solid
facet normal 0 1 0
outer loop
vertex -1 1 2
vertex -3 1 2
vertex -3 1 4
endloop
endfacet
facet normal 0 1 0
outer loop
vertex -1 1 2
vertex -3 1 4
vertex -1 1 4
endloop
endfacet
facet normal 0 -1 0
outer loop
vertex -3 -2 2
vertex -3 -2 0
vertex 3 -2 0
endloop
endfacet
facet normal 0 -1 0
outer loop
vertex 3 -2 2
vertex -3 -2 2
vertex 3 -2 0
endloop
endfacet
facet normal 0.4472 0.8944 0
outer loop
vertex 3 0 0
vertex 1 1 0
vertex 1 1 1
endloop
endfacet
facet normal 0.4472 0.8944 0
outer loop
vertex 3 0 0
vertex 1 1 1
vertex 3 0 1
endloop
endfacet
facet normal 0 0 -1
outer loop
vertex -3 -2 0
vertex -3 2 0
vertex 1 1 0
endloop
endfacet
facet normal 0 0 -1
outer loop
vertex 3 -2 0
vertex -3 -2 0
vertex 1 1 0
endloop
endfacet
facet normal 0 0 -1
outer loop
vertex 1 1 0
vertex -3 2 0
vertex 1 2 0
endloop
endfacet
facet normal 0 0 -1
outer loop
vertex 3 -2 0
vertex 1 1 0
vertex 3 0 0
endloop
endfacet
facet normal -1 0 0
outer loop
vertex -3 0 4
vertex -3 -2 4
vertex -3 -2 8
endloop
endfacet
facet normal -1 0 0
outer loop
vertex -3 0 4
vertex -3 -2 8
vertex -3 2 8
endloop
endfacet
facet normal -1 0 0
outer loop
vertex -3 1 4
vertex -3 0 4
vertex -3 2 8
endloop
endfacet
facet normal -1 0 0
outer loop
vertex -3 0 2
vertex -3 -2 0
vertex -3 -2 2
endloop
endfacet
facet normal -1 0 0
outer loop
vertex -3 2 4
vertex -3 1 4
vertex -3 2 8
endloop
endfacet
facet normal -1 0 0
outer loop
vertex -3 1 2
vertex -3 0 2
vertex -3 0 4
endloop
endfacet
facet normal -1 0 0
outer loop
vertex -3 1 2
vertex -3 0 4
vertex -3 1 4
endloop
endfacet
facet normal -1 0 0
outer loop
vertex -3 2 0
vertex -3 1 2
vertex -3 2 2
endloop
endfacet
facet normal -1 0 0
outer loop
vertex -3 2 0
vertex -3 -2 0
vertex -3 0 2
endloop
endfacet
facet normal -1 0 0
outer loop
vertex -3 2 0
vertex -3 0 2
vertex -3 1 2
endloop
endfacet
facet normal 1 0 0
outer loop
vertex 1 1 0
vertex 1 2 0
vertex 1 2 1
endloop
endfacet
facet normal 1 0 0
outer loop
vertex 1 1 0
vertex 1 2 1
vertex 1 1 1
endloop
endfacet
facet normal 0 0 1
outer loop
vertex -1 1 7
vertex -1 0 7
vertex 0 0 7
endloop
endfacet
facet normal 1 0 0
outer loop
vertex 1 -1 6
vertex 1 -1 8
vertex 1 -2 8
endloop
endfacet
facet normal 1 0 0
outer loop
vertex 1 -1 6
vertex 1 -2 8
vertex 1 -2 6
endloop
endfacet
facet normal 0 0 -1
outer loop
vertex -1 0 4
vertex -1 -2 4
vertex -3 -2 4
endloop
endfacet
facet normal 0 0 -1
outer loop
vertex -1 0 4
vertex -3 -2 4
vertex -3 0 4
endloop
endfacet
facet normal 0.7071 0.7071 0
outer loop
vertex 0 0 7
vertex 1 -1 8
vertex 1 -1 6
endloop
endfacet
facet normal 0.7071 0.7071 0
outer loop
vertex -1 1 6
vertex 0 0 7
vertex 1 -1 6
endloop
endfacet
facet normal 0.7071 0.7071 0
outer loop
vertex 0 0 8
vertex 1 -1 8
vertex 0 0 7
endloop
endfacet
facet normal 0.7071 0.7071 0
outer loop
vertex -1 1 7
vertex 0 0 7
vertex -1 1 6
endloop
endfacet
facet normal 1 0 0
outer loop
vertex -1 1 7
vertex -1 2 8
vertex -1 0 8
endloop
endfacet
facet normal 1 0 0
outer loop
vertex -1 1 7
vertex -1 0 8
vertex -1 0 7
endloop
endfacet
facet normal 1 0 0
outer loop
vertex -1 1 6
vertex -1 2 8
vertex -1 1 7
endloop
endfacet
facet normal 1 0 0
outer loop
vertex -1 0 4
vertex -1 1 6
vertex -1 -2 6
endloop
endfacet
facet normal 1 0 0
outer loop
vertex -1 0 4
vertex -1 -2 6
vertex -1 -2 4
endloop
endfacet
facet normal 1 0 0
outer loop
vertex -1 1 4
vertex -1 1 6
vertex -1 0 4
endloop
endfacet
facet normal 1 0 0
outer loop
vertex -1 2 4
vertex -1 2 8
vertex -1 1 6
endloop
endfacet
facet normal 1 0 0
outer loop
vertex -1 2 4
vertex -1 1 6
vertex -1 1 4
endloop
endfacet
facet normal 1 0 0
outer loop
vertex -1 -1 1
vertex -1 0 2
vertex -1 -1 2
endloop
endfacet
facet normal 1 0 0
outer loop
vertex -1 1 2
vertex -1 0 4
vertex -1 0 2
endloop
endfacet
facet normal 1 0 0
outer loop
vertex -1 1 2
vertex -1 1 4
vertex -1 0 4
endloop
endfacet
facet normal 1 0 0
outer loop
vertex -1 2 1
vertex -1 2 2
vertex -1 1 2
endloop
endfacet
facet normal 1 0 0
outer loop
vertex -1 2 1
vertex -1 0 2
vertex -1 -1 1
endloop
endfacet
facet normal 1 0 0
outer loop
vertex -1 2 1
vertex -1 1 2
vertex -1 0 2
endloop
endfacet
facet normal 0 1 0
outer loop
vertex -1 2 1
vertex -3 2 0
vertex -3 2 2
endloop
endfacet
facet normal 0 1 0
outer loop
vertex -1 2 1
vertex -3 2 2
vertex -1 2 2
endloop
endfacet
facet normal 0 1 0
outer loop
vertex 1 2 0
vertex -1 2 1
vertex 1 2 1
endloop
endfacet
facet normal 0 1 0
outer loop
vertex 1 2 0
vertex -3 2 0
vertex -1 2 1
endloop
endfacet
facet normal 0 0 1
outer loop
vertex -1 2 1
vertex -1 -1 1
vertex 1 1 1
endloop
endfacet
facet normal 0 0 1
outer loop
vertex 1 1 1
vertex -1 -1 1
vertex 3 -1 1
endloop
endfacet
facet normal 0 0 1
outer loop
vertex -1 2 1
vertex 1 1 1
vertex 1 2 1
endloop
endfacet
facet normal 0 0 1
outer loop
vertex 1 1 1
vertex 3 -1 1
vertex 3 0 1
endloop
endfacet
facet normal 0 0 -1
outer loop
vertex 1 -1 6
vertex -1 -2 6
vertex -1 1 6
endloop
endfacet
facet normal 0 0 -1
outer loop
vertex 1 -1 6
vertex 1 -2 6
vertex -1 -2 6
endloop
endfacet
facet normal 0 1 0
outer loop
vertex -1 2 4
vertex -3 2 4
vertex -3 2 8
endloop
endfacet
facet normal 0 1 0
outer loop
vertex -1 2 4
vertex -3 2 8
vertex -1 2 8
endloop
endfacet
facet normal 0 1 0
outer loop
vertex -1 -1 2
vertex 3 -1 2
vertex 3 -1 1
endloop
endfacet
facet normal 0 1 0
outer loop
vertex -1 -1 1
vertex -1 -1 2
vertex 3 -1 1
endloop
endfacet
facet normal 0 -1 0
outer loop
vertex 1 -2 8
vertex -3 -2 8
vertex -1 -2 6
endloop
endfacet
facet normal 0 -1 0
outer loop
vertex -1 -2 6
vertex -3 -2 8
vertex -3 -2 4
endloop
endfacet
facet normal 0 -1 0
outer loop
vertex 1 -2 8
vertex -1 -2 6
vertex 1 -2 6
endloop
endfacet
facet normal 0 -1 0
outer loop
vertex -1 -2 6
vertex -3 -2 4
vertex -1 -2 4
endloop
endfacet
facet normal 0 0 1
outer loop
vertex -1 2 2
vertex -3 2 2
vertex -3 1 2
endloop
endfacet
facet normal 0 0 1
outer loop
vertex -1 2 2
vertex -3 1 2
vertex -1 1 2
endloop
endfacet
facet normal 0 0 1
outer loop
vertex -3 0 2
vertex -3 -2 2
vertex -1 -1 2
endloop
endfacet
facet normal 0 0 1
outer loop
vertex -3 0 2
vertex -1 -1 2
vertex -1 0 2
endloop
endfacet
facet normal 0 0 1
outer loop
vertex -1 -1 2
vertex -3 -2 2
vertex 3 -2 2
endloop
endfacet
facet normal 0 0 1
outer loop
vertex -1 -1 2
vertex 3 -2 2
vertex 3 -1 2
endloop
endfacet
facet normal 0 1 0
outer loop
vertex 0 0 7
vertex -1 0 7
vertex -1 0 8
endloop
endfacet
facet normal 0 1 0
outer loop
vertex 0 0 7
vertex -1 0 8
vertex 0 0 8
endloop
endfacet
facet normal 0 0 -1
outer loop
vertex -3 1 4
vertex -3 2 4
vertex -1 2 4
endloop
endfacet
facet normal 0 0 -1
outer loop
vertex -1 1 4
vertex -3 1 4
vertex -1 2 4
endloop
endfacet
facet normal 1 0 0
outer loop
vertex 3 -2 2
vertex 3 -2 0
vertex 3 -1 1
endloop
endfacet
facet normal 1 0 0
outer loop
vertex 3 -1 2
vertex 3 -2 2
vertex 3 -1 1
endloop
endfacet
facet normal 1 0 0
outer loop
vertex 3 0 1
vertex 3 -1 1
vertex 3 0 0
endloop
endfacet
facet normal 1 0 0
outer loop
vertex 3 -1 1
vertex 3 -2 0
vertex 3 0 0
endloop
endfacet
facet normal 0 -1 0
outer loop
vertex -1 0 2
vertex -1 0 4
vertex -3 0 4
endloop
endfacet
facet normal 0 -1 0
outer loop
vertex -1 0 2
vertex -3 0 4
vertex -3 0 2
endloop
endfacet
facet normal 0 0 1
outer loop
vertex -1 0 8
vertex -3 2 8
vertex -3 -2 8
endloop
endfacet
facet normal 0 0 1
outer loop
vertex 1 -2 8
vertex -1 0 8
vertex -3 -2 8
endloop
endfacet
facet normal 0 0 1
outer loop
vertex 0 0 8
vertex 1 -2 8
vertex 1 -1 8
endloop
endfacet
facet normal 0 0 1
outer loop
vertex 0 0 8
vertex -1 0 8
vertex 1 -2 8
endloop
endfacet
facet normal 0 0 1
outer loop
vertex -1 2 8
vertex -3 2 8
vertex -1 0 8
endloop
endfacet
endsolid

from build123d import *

# Parameters (mm, degrees)
SKETCH1_W           = 6
SKETCH1_H           = 4
BOSS_EXTRUDE1_DEPTH = 8
SKETCH2_W           = 2
SKETCH2_H           = 2
CUT_EXTRUDE1_DEPTH  = 1
SKETCH4_W           = 5
SKETCH4_H           = 3
CUT_EXTRUDE13_DEPTH = 4
SKETCH5_W           = 4
SKETCH5_H           = 1
CUT_EXTRUDE14_DEPTH = 4
SKETCH6_W           = 2
SKETCH6_H           = 2
CUT_EXTRUDE15_DEPTH = 3
CUT_EXTRUDE16_DEPTH = 1
SKETCH8_W           = 1
SKETCH8_H           = 1
CUT_EXTRUDE17_DEPTH = 2
SKETCH10_W          = 2
SKETCH10_H          = 2
CUT_EXTRUDE18_DEPTH = 5
SKETCH12_W          = 2
SKETCH12_H          = 1
CUT_EXTRUDE19_DEPTH = 2
CUT_EXTRUDE20_DEPTH = 2


with BuildPart() as part:
    # Sketch1 → Boss-Extrude1 (new body)
    with BuildSketch(Plane.XY):
        Rectangle(SKETCH1_W, SKETCH1_H)
    extrude(amount=BOSS_EXTRUDE1_DEPTH)

    # Sketch2 → Cut-Extrude1 (cut)
    with BuildSketch(Plane(origin=(0, 2, 0), x_dir=(1, 0, 0), z_dir=(0, 1, 0))):
        with Locations((-2, -3)):
            Rectangle(SKETCH2_W, SKETCH2_H)
    extrude(amount=-CUT_EXTRUDE1_DEPTH, mode=Mode.SUBTRACT)

    # Sketch4 → Cut-Extrude13 (cut)
    with BuildSketch(Plane(origin=(3, 0, 0), x_dir=(0, 0, -1), z_dir=(1, 0, 0))):
        with Locations((-3.5, 0.5)):
            Rectangle(SKETCH4_W, SKETCH4_H)
    extrude(amount=-CUT_EXTRUDE13_DEPTH, mode=Mode.SUBTRACT)

    # Sketch5 → Cut-Extrude14 (cut)
    with BuildSketch(Plane(origin=(3, 0, 0), x_dir=(0, 0, -1), z_dir=(1, 0, 0))):
        with Locations((-4, -1.5)):
            Rectangle(SKETCH5_W, SKETCH5_H)
    extrude(amount=-CUT_EXTRUDE14_DEPTH, mode=Mode.SUBTRACT)

    # Sketch6 → Cut-Extrude15 (cut, through all)
    with BuildSketch(Plane(origin=(-1, 0, 0), x_dir=(0, 0, -1), z_dir=(1, 0, 0))):
        with Locations((-3, -1)):
            Rectangle(SKETCH6_W, SKETCH6_H)
    extrude(amount=-CUT_EXTRUDE15_DEPTH, mode=Mode.SUBTRACT)

    # Sketch7 → Cut-Extrude16 (cut)
    with BuildSketch(Plane(origin=(0, 0, 0), x_dir=(-1, 0, 0), z_dir=(0, 0, -1))):
        Polygon((-1, 2), (-1, 1), (-3, 0), (-3, 2), align=None)
    extrude(amount=-CUT_EXTRUDE16_DEPTH, mode=Mode.SUBTRACT)

    # Sketch8 → Cut-Extrude17 (cut)
    with BuildSketch(Plane(origin=(0, 2, 0), x_dir=(1, 0, 0), z_dir=(0, 1, 0))):
        with Locations((-0.5, -7.5)):
            Rectangle(SKETCH8_W, SKETCH8_H)
    extrude(amount=-CUT_EXTRUDE17_DEPTH, mode=Mode.SUBTRACT)

    # Sketch10 → Cut-Extrude18 (cut, through all)
    with BuildSketch(Plane(origin=(0, 2, 0), x_dir=(1, 0, 0), z_dir=(0, 1, 0))):
        with Locations((2, -7)):
            Rectangle(SKETCH10_W, SKETCH10_H)
    extrude(amount=-CUT_EXTRUDE18_DEPTH, mode=Mode.SUBTRACT)

    # Sketch12 → Cut-Extrude19 (cut)
    with BuildSketch(Plane(origin=(1, 0, 0), x_dir=(0, 0, -1), z_dir=(1, 0, 0))):
        with Locations((-7, 1.5)):
            Rectangle(SKETCH12_W, SKETCH12_H)
    extrude(amount=-CUT_EXTRUDE19_DEPTH, mode=Mode.SUBTRACT)

    # Sketch13 → Cut-Extrude20 (cut)
    with BuildSketch(Plane.XY.offset(8)):
        Polygon((1, -1), (-1, 1), (1, 1), align=None)
    extrude(amount=-CUT_EXTRUDE20_DEPTH, mode=Mode.SUBTRACT)


solid = part.part
